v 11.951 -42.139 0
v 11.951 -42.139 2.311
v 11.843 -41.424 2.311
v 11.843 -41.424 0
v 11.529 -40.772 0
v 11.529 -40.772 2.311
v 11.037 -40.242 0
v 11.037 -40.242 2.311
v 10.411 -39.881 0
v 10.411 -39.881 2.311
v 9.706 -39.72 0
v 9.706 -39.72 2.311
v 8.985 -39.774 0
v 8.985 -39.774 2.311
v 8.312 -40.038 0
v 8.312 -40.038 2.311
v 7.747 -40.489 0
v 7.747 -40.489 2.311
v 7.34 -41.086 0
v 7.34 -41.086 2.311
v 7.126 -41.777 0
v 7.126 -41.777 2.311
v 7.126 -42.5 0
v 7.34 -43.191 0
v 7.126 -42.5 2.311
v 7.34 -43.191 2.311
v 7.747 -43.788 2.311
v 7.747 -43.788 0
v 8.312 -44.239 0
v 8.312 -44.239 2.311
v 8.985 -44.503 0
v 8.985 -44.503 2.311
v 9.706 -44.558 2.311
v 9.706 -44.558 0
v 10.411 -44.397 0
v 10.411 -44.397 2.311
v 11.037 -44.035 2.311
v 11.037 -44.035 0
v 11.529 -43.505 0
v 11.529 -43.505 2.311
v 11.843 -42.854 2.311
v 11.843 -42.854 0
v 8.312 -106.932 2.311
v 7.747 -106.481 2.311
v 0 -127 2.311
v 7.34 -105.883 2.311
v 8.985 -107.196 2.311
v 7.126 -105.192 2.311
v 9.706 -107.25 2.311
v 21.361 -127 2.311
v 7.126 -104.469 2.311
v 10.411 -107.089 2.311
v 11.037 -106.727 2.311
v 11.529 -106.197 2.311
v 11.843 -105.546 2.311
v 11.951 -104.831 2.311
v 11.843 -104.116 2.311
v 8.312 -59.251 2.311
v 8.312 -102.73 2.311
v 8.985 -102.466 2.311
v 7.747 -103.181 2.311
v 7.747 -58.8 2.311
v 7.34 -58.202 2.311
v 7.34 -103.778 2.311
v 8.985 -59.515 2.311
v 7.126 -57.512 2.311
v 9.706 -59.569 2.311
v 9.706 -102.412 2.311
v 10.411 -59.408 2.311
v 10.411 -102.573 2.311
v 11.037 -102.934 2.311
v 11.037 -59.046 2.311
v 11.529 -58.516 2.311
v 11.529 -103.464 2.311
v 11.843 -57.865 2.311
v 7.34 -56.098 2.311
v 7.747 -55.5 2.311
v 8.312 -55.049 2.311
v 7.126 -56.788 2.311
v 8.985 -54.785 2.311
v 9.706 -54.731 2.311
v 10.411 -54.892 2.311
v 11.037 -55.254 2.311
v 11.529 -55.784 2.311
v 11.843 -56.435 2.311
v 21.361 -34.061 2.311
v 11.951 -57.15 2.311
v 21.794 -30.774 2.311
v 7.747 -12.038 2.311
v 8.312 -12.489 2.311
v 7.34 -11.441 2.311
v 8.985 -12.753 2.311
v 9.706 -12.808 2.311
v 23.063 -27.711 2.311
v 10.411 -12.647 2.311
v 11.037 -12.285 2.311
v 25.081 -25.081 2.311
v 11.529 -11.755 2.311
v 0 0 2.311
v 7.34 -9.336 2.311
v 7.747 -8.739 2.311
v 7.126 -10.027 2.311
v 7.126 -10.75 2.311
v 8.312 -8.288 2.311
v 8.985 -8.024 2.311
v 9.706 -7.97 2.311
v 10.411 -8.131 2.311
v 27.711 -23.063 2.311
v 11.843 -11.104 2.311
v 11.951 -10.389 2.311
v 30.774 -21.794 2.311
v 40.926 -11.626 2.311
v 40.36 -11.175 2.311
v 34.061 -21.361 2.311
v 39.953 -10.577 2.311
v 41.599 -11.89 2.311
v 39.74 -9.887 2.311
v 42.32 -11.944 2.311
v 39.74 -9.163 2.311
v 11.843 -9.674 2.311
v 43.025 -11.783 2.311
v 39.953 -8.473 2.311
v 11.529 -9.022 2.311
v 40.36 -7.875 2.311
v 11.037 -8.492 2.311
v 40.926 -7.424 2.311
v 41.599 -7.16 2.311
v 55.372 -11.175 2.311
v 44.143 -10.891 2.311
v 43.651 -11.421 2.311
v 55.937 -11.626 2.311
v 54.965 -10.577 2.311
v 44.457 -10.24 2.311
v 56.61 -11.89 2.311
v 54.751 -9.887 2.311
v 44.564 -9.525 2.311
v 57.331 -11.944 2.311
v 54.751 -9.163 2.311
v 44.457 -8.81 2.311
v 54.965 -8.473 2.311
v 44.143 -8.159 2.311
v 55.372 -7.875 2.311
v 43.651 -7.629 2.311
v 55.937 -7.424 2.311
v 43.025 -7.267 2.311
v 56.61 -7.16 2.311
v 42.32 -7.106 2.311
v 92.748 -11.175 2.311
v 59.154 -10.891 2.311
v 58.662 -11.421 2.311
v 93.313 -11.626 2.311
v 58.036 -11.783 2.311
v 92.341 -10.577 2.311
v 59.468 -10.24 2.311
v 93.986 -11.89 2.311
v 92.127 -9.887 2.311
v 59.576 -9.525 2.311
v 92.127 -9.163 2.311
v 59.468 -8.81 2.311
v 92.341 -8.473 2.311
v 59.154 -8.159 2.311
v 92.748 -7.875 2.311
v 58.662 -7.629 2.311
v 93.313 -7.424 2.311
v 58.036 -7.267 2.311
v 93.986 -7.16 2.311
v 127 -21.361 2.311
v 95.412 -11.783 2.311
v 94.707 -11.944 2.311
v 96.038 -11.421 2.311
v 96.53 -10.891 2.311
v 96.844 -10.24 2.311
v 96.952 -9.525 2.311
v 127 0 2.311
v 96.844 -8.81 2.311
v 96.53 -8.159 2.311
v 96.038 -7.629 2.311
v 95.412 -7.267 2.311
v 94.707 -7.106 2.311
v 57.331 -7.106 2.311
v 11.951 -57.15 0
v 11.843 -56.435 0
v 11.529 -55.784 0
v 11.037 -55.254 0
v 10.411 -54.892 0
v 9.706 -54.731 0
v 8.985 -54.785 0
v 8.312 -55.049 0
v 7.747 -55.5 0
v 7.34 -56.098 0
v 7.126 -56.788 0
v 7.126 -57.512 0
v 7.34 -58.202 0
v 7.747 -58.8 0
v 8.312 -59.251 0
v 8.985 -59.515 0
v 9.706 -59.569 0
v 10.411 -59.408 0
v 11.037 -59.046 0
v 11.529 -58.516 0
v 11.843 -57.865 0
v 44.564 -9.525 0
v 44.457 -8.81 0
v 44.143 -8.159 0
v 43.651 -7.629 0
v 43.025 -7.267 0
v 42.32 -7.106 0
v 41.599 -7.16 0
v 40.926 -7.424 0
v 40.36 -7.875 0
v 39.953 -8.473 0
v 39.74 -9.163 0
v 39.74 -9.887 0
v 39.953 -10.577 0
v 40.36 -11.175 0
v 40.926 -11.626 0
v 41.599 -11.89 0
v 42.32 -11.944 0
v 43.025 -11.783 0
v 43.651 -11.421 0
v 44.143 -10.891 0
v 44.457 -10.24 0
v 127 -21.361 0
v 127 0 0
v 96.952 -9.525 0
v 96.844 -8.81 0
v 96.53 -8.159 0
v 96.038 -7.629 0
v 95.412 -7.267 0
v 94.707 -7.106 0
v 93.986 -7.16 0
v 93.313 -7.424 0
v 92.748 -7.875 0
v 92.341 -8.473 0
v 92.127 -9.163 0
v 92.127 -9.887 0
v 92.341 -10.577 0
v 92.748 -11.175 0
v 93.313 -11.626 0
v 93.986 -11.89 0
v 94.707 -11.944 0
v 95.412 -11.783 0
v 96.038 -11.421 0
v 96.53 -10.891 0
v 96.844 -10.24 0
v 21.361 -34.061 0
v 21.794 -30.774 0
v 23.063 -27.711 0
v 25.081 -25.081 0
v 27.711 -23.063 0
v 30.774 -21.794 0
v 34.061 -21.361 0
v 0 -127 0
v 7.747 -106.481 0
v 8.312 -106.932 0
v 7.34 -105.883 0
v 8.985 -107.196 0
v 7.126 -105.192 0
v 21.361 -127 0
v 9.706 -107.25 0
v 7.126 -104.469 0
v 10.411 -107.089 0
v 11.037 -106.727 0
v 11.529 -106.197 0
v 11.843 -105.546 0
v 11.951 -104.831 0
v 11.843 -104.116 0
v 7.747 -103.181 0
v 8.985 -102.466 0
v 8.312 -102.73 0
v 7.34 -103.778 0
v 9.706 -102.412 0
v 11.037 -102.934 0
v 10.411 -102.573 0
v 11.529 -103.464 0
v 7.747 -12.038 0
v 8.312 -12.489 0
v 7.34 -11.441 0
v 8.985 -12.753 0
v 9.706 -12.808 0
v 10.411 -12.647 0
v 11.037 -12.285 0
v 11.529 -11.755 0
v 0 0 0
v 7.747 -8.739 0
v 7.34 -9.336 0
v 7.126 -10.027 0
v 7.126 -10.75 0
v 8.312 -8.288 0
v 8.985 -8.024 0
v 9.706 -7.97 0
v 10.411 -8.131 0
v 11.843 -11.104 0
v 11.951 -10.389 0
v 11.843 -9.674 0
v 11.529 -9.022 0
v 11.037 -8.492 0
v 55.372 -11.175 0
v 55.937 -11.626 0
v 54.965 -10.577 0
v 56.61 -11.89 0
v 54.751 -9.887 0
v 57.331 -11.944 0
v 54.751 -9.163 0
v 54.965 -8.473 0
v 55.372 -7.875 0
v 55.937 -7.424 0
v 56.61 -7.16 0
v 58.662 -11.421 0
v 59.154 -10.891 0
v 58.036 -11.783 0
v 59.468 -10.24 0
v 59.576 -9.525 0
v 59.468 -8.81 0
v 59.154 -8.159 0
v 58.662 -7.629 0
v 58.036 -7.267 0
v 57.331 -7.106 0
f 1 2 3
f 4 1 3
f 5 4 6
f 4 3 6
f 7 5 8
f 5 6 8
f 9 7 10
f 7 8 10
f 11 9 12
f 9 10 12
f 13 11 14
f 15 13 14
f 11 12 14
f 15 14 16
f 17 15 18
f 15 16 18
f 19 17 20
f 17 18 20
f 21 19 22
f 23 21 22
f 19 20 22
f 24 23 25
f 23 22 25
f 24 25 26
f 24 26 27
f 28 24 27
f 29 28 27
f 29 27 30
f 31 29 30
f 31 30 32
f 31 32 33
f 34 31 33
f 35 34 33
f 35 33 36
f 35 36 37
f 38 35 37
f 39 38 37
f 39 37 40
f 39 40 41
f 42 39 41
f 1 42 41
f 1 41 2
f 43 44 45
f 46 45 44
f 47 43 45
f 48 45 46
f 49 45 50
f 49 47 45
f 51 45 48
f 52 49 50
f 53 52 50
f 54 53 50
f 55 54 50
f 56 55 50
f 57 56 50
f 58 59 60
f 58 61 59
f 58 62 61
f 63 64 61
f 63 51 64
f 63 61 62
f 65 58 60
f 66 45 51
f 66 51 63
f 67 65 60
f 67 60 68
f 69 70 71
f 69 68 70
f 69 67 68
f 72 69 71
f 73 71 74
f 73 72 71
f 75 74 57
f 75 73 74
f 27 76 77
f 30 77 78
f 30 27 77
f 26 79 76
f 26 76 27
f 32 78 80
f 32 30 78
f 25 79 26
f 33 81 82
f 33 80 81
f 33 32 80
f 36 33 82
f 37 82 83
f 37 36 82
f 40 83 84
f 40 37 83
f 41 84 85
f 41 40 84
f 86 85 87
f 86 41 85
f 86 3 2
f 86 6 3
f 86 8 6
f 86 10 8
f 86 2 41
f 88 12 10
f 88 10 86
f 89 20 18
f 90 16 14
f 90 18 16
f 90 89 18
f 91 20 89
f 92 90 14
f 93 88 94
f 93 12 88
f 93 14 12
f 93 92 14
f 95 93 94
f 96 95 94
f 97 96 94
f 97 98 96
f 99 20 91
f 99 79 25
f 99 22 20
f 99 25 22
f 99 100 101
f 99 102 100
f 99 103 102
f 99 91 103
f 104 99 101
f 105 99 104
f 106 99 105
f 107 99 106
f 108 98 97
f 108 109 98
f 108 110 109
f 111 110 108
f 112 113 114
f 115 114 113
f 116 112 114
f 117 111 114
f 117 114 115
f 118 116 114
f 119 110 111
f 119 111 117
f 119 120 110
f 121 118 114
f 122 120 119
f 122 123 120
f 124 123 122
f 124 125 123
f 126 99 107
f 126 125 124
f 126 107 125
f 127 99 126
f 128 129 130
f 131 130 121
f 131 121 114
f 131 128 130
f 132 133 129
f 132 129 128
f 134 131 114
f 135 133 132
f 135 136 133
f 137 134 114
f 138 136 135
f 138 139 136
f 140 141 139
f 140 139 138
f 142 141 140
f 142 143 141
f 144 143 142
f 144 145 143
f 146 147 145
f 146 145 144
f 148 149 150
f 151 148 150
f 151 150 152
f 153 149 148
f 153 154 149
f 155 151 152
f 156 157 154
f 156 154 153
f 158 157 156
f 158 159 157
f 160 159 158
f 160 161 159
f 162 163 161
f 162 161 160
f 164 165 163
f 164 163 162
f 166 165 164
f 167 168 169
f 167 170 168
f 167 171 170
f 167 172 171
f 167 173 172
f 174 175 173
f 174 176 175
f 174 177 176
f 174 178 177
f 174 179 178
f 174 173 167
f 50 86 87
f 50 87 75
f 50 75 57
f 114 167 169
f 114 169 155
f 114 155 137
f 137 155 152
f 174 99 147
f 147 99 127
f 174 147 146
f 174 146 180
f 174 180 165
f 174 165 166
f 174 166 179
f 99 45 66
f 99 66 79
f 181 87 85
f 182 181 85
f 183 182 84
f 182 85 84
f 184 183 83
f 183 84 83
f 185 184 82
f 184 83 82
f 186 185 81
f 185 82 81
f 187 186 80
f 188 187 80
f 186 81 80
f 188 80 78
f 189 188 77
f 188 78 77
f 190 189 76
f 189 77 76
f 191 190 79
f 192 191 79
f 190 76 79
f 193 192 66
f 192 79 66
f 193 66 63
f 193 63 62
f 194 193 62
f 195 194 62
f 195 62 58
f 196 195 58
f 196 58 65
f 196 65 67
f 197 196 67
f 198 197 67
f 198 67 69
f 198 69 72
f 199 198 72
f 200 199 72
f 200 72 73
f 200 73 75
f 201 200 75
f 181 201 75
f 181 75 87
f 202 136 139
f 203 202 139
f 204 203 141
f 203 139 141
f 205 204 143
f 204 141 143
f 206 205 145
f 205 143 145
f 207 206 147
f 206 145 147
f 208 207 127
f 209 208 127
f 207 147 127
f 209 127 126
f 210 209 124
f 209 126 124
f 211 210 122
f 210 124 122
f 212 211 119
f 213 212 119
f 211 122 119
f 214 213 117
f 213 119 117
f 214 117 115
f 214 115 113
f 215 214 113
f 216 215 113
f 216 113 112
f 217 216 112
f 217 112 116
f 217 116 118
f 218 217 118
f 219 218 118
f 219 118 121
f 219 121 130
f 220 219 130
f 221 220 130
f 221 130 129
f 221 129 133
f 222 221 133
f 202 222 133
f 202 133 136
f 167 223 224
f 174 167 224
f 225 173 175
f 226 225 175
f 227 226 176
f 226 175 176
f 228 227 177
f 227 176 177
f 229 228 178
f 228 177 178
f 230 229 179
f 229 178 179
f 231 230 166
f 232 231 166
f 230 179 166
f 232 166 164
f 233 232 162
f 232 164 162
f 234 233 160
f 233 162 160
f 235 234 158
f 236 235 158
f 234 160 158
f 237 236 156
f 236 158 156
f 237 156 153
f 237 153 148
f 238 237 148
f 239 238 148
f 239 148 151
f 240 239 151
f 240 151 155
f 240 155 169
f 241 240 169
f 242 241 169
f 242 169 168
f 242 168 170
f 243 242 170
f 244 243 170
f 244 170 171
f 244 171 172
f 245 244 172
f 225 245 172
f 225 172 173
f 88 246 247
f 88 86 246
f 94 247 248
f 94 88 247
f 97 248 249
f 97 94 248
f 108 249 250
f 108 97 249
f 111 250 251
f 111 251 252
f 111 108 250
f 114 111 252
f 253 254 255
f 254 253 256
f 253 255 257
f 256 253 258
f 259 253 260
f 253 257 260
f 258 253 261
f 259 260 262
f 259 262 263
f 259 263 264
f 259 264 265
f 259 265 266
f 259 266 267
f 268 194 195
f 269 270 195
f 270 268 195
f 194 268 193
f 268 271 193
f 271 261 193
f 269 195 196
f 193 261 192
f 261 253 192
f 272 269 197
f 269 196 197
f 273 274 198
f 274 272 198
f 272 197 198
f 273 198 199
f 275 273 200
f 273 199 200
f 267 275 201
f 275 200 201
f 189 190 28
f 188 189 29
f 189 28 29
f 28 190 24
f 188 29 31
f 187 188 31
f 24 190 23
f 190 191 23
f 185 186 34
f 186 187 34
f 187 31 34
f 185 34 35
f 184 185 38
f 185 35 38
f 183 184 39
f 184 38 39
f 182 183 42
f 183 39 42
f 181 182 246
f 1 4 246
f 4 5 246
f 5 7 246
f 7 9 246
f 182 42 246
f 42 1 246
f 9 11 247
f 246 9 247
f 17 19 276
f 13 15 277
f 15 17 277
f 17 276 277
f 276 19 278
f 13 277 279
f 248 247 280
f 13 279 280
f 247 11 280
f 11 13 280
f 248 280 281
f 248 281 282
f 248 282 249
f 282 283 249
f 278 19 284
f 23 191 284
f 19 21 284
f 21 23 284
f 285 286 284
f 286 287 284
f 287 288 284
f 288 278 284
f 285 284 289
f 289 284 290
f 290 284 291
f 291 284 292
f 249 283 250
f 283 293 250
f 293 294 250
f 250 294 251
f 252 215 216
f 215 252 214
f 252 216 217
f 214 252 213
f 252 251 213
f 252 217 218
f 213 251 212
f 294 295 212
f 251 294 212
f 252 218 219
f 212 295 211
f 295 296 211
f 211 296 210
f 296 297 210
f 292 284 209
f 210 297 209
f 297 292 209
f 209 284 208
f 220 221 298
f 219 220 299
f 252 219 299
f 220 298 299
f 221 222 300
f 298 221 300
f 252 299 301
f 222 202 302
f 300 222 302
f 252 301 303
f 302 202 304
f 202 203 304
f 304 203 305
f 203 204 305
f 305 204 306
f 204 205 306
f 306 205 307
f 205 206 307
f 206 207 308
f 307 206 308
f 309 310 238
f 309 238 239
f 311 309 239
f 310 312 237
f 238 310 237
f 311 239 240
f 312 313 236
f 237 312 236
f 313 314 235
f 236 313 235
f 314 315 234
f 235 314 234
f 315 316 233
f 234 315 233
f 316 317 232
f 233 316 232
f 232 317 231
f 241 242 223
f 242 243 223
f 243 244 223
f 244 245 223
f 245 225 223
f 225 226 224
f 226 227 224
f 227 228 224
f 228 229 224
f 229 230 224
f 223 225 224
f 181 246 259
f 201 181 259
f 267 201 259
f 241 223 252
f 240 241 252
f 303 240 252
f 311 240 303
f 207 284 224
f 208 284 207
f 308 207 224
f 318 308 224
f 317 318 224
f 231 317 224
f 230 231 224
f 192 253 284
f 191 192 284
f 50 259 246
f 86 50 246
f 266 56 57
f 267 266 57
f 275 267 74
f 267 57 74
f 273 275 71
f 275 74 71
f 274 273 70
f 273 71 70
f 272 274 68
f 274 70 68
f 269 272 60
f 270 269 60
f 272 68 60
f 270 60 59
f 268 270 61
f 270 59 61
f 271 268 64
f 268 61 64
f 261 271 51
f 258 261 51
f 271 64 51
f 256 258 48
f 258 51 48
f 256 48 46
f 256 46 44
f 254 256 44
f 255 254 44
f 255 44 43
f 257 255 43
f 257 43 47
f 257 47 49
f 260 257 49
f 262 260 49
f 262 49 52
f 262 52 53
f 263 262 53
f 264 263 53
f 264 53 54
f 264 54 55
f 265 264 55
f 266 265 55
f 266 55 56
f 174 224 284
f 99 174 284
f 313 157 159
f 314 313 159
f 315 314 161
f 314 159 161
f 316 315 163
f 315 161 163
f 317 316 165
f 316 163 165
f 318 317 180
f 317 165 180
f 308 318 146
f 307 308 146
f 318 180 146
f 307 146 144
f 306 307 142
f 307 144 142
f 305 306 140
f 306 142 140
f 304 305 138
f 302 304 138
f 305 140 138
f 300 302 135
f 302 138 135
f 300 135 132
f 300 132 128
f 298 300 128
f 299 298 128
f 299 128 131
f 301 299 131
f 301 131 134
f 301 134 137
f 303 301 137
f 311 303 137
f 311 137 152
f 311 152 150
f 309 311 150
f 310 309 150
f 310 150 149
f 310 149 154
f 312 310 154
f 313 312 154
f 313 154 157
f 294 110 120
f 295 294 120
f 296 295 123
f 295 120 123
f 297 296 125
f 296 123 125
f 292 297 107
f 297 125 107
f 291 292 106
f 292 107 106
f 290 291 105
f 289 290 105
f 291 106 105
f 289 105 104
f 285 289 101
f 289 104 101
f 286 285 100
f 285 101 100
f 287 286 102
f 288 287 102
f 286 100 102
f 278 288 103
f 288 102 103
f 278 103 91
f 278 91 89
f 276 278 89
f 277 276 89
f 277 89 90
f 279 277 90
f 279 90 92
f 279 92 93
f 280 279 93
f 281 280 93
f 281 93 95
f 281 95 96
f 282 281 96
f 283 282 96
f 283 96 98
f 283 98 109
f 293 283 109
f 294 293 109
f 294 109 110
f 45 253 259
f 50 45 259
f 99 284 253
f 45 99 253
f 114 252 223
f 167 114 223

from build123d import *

# Parameters (mm, degrees)
BOSS_EXTRUDE1_DEPTH = 2.3114
FILLET1_R           = 12.7
SKETCH2_R           = 2.4257
CUT_EXTRUDE1_DEPTH  = 180.619994906
SKETCH3_R           = 2.4257
CUT_EXTRUDE2_DEPTH  = 180.619994906
SKETCH4_R           = 2.4257
CUT_EXTRUDE3_DEPTH  = 180.619994906
SKETCH5_R           = 2.4257
CUT_EXTRUDE4_DEPTH  = 180.619994906
SKETCH6_R           = 2.4257
CUT_EXTRUDE5_DEPTH  = 180.619994906


with BuildPart() as part:
    # Sketch1 → Boss-Extrude1 (new body)
    with BuildSketch(Plane.XY):
        Polygon((0, 0), (0, -127), (21.3614, -127), (21.3614, -21.3614), (127, -21.3614), (127, 0), align=None)
    extrude(amount=BOSS_EXTRUDE1_DEPTH)

    # Fillet1
    fillet1_edges = [part.edges().sort_by_distance(p)[0] for p in [
        (21.3614, -21.3614, 1.1557),
    ]]
    fillet(fillet1_edges, radius=FILLET1_R)

    # Sketch2 → Cut-Extrude1 (cut, through all)
    with BuildSketch(Plane.XY.offset(2.3114)):
        with Locations((9.525, -104.83088)):
            Circle(SKETCH2_R)
        with Locations((94.5261, -9.525)):
            Circle(SKETCH2_R)
    extrude(amount=-CUT_EXTRUDE1_DEPTH, mode=Mode.SUBTRACT)

    # Sketch3 → Cut-Extrude2 (cut, through all)
    with BuildSketch(Plane.XY.offset(2.3114)):
        with Locations((42.1386, -9.525)):
            Circle(SKETCH3_R)
        with Locations((9.525, -10.3886)):
            Circle(SKETCH3_R)
    extrude(amount=-CUT_EXTRUDE2_DEPTH, mode=Mode.SUBTRACT)

    # Sketch4 → Cut-Extrude3 (cut, through all)
    with BuildSketch(Plane.XY.offset(2.3114)):
        with Locations((9.525, -42.1386)):
            Circle(SKETCH4_R)
    extrude(amount=-CUT_EXTRUDE3_DEPTH, mode=Mode.SUBTRACT)

    # Sketch5 → Cut-Extrude4 (cut, through all)
    with BuildSketch(Plane.XY.offset(2.3114)):
        with Locations((9.525, -57.15)):
            Circle(SKETCH5_R)
    extrude(amount=-CUT_EXTRUDE4_DEPTH, mode=Mode.SUBTRACT)

    # Sketch6 → Cut-Extrude5 (cut, through all)
    with BuildSketch(Plane.XY.offset(2.3114)):
        with Locations((57.15, -9.525)):
            Circle(SKETCH6_R)
    extrude(amount=-CUT_EXTRUDE5_DEPTH, mode=Mode.SUBTRACT)


solid = part.part
